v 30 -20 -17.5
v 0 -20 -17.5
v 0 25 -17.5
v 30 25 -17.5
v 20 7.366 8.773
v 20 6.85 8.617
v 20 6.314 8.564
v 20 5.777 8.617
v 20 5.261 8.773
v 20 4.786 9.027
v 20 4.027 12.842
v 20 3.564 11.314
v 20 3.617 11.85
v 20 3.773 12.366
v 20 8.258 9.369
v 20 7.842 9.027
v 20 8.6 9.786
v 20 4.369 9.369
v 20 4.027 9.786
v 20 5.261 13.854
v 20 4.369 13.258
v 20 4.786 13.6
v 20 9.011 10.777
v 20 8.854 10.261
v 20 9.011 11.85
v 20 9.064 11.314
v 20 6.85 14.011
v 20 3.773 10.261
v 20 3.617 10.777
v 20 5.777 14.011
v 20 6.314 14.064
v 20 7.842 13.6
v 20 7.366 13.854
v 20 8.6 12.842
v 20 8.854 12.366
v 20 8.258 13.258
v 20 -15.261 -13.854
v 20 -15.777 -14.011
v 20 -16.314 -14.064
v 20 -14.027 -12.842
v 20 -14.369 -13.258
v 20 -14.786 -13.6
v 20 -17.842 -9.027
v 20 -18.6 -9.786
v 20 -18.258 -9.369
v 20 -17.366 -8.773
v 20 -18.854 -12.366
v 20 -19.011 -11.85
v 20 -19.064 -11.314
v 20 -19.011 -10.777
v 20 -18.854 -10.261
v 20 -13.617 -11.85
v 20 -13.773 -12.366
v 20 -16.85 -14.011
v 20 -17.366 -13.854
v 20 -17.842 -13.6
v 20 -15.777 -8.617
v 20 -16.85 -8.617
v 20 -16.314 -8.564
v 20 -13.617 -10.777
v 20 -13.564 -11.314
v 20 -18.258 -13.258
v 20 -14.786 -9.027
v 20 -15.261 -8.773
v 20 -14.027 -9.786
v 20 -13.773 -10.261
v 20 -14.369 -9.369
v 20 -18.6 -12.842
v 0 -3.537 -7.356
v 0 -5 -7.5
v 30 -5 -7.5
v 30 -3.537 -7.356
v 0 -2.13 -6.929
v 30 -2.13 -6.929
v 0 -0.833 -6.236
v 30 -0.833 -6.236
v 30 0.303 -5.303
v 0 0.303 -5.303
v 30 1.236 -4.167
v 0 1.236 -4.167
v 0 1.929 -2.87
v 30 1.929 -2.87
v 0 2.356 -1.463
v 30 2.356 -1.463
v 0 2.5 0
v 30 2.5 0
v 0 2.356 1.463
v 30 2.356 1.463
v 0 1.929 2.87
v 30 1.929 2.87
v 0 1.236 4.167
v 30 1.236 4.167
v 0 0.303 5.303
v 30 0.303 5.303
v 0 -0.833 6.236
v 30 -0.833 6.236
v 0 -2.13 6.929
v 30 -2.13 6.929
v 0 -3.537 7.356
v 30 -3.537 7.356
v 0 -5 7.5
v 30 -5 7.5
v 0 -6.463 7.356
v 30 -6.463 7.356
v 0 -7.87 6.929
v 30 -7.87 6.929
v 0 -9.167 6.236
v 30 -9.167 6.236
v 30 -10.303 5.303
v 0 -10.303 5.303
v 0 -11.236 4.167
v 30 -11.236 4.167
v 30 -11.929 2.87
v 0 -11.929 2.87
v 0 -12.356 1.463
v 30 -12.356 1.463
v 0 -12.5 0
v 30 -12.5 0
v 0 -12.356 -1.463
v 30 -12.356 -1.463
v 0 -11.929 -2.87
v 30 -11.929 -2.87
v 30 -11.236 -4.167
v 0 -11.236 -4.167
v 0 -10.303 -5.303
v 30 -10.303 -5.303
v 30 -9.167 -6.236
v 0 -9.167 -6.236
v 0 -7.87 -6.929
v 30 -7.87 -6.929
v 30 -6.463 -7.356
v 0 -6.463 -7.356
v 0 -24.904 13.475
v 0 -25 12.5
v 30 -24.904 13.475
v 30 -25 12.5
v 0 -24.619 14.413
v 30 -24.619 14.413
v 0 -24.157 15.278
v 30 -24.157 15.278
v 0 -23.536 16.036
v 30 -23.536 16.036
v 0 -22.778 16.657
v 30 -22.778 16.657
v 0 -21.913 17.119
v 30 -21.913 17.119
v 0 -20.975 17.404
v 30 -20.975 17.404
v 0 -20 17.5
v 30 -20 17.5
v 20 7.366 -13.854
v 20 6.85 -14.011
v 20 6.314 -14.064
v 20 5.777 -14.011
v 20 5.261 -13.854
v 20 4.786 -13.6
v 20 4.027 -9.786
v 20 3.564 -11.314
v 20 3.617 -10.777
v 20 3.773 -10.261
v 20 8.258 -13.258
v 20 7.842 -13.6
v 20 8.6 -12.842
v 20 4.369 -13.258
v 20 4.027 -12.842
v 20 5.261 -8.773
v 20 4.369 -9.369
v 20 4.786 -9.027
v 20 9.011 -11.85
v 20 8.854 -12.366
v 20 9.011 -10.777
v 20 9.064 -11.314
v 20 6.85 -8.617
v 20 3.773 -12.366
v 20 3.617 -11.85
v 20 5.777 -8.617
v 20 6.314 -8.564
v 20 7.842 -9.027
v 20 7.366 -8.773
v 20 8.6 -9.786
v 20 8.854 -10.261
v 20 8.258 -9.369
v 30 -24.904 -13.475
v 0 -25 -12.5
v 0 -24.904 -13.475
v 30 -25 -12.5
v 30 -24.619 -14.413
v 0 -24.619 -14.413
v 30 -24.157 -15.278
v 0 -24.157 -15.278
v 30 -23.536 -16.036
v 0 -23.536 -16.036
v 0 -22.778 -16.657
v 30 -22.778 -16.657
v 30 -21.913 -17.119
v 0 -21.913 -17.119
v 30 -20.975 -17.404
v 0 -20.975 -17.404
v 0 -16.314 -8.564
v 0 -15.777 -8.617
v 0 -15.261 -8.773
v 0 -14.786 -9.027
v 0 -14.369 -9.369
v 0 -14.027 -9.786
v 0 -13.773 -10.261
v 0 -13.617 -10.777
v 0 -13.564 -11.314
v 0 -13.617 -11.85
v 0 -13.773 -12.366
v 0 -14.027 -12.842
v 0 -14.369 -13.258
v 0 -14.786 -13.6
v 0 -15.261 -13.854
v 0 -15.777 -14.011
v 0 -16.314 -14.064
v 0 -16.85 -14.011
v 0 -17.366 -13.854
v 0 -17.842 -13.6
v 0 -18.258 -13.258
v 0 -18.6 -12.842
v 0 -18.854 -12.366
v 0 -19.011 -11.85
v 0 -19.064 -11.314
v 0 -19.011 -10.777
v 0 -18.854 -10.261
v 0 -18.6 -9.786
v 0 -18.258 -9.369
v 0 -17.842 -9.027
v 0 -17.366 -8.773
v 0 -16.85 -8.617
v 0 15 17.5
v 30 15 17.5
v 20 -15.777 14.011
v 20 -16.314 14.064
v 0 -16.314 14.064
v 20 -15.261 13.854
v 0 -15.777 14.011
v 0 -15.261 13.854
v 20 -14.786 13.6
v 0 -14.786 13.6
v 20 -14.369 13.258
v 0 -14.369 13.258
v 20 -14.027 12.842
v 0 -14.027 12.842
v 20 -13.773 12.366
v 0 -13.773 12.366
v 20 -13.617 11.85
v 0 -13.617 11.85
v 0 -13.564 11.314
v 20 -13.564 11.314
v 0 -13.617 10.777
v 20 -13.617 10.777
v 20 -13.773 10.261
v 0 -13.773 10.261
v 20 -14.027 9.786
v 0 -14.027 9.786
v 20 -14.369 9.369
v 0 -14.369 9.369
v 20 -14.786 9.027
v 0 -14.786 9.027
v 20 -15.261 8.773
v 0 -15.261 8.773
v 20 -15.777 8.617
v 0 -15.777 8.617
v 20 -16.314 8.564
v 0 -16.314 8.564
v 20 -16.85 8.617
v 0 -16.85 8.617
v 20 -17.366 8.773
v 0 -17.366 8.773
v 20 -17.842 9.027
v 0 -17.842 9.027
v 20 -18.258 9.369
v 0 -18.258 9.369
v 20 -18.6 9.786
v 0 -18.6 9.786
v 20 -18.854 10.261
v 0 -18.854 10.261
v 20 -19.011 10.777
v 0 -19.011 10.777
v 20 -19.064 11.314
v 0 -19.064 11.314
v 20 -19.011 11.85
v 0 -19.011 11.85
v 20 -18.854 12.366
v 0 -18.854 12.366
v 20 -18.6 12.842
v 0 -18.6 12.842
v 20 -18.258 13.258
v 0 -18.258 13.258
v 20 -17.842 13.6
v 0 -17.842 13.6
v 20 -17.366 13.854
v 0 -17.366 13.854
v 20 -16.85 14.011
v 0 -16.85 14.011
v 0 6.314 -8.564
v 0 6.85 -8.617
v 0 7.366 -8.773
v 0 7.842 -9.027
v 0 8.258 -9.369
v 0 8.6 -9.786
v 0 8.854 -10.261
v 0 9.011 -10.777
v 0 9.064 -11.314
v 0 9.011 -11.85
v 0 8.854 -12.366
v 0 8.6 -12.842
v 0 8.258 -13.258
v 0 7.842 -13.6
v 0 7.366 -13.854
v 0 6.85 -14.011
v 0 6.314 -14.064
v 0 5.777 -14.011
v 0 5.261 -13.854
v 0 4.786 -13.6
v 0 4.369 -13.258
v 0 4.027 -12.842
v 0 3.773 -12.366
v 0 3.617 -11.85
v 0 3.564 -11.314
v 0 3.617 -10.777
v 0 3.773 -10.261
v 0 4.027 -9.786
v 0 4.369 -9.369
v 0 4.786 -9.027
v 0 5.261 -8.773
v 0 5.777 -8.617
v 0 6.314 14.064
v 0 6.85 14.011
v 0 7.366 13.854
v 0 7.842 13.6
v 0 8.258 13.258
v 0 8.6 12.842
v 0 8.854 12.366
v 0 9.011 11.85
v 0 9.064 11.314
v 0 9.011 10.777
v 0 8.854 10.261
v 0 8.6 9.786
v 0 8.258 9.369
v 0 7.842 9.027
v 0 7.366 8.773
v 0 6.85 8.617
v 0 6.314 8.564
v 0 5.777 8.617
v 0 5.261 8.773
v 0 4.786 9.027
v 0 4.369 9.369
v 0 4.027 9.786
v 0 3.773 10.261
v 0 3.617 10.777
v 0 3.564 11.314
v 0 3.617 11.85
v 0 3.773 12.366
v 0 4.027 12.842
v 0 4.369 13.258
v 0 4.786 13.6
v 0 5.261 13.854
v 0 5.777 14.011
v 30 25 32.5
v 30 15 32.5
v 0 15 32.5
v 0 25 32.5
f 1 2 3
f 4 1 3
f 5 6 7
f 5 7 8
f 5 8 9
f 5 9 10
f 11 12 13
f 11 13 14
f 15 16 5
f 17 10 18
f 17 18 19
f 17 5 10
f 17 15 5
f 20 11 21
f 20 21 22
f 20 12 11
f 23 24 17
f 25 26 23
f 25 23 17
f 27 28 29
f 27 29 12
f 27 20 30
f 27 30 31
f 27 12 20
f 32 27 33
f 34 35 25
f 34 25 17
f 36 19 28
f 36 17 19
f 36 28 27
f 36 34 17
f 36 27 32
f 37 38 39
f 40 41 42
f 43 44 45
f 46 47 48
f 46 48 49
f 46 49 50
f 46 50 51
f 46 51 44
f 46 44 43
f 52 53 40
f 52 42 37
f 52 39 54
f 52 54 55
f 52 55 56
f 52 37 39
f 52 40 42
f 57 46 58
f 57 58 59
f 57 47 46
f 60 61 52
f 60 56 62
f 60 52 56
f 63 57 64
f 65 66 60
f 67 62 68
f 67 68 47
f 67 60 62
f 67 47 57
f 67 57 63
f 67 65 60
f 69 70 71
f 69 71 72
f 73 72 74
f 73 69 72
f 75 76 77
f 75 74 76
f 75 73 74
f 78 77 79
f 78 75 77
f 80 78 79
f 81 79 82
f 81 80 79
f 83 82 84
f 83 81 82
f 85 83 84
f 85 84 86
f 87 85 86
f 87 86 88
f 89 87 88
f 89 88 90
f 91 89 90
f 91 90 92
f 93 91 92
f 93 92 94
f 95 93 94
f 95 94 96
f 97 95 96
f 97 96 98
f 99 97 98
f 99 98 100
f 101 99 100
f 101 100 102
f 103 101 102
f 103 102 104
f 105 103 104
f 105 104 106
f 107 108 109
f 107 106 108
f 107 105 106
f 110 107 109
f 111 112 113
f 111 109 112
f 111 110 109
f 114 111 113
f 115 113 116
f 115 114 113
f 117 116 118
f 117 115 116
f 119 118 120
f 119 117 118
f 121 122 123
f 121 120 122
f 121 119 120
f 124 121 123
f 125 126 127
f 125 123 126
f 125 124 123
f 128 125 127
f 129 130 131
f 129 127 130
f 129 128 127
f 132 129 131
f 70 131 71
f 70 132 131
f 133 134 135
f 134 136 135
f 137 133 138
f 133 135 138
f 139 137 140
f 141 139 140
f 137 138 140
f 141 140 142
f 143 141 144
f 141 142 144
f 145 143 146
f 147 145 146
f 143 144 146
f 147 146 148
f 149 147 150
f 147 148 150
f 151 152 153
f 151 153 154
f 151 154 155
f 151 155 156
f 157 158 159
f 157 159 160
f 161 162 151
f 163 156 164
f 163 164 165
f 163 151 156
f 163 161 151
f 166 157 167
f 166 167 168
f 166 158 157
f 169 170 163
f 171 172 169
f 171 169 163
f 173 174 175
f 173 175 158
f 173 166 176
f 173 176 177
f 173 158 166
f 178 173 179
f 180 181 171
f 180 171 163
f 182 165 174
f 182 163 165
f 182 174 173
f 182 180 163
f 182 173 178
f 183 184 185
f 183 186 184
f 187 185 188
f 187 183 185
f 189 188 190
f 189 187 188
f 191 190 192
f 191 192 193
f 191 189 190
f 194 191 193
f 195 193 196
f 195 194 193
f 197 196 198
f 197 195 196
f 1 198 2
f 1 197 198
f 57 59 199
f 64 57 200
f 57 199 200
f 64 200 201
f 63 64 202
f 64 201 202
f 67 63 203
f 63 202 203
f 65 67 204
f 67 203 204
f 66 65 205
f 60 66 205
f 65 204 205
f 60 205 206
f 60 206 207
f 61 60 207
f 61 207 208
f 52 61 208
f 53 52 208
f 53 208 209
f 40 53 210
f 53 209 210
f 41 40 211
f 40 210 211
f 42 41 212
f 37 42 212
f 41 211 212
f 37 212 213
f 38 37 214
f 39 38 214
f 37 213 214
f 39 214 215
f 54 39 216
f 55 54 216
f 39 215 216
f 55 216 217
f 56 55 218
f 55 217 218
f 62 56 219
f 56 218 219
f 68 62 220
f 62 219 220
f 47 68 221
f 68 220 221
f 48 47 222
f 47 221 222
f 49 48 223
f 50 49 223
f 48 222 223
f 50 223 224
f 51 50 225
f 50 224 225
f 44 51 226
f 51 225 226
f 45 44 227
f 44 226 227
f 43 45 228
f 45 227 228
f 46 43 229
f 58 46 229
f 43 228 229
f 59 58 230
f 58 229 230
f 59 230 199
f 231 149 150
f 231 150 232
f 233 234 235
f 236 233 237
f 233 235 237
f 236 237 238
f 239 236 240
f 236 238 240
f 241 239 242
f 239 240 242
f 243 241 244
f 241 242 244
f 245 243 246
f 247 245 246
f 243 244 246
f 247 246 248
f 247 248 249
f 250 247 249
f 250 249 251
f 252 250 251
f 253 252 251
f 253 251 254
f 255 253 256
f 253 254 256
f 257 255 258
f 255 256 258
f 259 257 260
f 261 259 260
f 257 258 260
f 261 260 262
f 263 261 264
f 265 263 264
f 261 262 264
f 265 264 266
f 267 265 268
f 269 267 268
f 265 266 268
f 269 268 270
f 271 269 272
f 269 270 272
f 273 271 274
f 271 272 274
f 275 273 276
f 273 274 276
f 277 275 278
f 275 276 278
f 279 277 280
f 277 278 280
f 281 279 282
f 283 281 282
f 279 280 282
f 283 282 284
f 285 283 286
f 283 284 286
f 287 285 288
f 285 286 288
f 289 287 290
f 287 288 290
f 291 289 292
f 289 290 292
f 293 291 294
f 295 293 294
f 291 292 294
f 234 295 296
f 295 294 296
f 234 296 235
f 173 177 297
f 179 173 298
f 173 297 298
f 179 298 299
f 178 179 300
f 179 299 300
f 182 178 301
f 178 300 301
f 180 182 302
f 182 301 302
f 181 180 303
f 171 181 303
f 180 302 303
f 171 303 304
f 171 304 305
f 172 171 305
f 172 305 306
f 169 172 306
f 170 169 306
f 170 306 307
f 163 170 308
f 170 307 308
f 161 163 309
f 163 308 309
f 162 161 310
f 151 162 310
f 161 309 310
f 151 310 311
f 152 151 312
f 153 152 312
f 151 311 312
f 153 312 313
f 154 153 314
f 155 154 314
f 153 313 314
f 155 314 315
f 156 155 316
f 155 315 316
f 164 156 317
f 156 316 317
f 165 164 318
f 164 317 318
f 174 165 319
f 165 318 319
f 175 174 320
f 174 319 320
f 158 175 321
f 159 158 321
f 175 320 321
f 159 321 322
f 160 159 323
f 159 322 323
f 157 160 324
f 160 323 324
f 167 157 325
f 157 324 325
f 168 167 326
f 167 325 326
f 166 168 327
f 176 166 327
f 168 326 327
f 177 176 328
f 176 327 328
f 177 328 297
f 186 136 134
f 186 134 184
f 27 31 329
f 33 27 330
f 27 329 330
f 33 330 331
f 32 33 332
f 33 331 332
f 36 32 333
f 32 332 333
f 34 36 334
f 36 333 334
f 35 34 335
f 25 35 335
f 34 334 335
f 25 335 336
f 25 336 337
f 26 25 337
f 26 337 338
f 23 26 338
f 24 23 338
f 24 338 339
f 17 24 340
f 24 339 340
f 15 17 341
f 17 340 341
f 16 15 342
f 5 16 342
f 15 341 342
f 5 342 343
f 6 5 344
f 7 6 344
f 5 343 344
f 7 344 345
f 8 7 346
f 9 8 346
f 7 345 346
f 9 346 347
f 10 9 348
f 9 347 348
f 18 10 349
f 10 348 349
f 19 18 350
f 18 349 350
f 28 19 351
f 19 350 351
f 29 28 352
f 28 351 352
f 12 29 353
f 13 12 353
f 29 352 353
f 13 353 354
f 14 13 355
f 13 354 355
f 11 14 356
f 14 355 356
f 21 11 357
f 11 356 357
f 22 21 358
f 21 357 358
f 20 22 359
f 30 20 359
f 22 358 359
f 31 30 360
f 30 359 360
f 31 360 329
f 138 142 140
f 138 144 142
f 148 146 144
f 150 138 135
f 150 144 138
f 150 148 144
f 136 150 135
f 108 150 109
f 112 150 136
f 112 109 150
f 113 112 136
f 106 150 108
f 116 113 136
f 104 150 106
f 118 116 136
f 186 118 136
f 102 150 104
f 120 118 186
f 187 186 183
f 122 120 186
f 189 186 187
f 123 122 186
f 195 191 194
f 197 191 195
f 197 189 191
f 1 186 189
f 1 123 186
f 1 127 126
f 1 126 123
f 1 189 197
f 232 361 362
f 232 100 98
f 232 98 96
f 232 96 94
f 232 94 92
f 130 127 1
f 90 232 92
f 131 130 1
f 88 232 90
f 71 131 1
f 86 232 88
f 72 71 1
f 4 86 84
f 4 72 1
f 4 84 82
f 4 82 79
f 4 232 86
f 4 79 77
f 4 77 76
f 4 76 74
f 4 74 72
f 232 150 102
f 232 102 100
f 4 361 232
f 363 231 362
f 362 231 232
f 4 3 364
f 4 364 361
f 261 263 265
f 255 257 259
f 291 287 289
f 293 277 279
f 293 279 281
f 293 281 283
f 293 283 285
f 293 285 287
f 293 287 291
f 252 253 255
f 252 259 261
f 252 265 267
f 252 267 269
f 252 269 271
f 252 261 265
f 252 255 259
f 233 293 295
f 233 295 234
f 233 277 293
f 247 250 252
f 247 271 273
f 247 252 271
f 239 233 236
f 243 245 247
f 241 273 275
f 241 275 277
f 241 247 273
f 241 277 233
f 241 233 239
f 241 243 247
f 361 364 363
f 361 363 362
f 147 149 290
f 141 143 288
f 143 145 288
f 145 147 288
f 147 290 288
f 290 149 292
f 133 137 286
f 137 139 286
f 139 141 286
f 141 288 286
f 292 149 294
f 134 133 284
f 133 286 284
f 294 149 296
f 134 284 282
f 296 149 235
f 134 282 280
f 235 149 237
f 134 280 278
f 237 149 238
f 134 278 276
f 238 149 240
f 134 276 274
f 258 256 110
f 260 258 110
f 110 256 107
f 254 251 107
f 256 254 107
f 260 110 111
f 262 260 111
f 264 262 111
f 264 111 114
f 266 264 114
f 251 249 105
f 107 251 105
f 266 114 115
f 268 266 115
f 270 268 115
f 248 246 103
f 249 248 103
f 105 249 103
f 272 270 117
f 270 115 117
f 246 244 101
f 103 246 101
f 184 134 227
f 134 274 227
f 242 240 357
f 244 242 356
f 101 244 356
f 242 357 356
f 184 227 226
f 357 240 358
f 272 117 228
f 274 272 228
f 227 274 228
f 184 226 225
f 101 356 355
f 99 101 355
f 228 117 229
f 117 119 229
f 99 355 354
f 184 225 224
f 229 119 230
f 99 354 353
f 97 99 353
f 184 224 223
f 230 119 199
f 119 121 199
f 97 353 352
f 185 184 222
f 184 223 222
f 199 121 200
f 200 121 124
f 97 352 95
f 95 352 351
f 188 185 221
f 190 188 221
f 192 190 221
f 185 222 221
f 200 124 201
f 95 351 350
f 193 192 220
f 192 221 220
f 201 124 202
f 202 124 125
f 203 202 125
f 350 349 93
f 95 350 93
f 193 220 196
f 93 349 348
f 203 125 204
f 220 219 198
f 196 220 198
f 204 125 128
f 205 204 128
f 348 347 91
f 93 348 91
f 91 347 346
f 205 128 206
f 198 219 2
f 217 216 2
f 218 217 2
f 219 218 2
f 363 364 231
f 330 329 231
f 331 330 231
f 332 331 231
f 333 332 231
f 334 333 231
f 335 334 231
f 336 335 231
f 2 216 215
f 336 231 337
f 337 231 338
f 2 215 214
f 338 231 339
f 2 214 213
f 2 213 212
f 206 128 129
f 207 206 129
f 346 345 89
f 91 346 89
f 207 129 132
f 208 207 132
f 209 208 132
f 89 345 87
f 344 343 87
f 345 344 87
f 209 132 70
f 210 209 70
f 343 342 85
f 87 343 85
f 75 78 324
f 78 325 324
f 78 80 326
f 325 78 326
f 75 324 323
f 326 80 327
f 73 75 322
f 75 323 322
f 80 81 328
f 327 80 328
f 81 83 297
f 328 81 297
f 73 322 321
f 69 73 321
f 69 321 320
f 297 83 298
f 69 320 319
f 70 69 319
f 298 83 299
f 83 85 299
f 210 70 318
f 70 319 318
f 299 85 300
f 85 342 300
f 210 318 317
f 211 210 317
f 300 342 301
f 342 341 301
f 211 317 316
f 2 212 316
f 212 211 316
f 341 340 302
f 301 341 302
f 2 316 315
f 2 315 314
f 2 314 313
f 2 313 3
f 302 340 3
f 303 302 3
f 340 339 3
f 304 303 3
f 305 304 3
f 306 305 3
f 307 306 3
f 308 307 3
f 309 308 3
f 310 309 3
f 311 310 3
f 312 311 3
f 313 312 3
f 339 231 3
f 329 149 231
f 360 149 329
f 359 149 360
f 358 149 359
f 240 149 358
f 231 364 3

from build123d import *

# Parameters (mm, degrees)
SKETCH_2_W               = 35
SKETCH_2_H               = 50
EXTRUDE_1_DEPTH          = 30
CUT_EXTRUDE_1_DEPTH      = 43.793106922
CUT_EXTRUDE_1_DEPTH_BACK = 43.793106922
SKETCH_3_R               = 7.5
FILLET_1_R               = 5
FILLET_2_R               = 5
SKETCH_4_R               = 2.75
CUT_EXTRUDE_2_DEPTH      = 20
SKETCH_5_W               = 30
SKETCH_5_H               = 15
EXTRUDE_2_DEPTH          = 10


with BuildPart() as part:
    # 草图2 → 凸台-拉伸1 (new body)
    with BuildSketch(Plane(origin=(0, 0, 0), x_dir=(0, 0, -1), z_dir=(1, 0, 0))):
        Rectangle(SKETCH_2_W, SKETCH_2_H)
    extrude(amount=EXTRUDE_1_DEPTH)

    # 草图3 → 切除-拉伸1 (cut, two sides: drawn at the far end of the back side and taken through both)
    with BuildSketch(Plane(origin=(30, 0, 0), x_dir=(0, 0, -1), z_dir=(1, 0, 0)).offset(-CUT_EXTRUDE_1_DEPTH_BACK)):
        with Locations((0, -5)):
            Circle(SKETCH_3_R)
    extrude(amount=CUT_EXTRUDE_1_DEPTH + CUT_EXTRUDE_1_DEPTH_BACK, mode=Mode.SUBTRACT)

    # 圆角1
    fillet_1_edges = [part.edges().sort_by_distance(p)[0] for p in [
        (15, -25, -17.5),
    ]]
    fillet(fillet_1_edges, radius=FILLET_1_R)

    # 圆角2
    fillet_2_edges = [part.edges().sort_by_distance(p)[0] for p in [
        (15, -25, 17.5),
    ]]
    fillet(fillet_2_edges, radius=FILLET_2_R)

    # 草图4 → 切除-拉伸2 (cut)
    with BuildSketch(Plane.ZY):
        with Locations((11.313708499, 6.313708499)):
            Circle(SKETCH_4_R)
        with Locations((-11.313708499, 6.313708499)):
            Circle(SKETCH_4_R)
        with Locations((-11.313708499, -16.313708499)):
            Circle(SKETCH_4_R)
        with Locations((11.313708499, -16.313708499)):
            Circle(SKETCH_4_R)
    extrude(amount=-CUT_EXTRUDE_2_DEPTH, mode=Mode.SUBTRACT)

    # 草图5 → 凸台-拉伸2 (add)
    with BuildSketch(Plane(origin=(0, 25, 0), x_dir=(1, 0, 0), z_dir=(0, 1, 0))):
        with Locations((15, -25)):
            Rectangle(SKETCH_5_W, SKETCH_5_H)
    extrude(amount=-EXTRUDE_2_DEPTH)


solid = part.part
